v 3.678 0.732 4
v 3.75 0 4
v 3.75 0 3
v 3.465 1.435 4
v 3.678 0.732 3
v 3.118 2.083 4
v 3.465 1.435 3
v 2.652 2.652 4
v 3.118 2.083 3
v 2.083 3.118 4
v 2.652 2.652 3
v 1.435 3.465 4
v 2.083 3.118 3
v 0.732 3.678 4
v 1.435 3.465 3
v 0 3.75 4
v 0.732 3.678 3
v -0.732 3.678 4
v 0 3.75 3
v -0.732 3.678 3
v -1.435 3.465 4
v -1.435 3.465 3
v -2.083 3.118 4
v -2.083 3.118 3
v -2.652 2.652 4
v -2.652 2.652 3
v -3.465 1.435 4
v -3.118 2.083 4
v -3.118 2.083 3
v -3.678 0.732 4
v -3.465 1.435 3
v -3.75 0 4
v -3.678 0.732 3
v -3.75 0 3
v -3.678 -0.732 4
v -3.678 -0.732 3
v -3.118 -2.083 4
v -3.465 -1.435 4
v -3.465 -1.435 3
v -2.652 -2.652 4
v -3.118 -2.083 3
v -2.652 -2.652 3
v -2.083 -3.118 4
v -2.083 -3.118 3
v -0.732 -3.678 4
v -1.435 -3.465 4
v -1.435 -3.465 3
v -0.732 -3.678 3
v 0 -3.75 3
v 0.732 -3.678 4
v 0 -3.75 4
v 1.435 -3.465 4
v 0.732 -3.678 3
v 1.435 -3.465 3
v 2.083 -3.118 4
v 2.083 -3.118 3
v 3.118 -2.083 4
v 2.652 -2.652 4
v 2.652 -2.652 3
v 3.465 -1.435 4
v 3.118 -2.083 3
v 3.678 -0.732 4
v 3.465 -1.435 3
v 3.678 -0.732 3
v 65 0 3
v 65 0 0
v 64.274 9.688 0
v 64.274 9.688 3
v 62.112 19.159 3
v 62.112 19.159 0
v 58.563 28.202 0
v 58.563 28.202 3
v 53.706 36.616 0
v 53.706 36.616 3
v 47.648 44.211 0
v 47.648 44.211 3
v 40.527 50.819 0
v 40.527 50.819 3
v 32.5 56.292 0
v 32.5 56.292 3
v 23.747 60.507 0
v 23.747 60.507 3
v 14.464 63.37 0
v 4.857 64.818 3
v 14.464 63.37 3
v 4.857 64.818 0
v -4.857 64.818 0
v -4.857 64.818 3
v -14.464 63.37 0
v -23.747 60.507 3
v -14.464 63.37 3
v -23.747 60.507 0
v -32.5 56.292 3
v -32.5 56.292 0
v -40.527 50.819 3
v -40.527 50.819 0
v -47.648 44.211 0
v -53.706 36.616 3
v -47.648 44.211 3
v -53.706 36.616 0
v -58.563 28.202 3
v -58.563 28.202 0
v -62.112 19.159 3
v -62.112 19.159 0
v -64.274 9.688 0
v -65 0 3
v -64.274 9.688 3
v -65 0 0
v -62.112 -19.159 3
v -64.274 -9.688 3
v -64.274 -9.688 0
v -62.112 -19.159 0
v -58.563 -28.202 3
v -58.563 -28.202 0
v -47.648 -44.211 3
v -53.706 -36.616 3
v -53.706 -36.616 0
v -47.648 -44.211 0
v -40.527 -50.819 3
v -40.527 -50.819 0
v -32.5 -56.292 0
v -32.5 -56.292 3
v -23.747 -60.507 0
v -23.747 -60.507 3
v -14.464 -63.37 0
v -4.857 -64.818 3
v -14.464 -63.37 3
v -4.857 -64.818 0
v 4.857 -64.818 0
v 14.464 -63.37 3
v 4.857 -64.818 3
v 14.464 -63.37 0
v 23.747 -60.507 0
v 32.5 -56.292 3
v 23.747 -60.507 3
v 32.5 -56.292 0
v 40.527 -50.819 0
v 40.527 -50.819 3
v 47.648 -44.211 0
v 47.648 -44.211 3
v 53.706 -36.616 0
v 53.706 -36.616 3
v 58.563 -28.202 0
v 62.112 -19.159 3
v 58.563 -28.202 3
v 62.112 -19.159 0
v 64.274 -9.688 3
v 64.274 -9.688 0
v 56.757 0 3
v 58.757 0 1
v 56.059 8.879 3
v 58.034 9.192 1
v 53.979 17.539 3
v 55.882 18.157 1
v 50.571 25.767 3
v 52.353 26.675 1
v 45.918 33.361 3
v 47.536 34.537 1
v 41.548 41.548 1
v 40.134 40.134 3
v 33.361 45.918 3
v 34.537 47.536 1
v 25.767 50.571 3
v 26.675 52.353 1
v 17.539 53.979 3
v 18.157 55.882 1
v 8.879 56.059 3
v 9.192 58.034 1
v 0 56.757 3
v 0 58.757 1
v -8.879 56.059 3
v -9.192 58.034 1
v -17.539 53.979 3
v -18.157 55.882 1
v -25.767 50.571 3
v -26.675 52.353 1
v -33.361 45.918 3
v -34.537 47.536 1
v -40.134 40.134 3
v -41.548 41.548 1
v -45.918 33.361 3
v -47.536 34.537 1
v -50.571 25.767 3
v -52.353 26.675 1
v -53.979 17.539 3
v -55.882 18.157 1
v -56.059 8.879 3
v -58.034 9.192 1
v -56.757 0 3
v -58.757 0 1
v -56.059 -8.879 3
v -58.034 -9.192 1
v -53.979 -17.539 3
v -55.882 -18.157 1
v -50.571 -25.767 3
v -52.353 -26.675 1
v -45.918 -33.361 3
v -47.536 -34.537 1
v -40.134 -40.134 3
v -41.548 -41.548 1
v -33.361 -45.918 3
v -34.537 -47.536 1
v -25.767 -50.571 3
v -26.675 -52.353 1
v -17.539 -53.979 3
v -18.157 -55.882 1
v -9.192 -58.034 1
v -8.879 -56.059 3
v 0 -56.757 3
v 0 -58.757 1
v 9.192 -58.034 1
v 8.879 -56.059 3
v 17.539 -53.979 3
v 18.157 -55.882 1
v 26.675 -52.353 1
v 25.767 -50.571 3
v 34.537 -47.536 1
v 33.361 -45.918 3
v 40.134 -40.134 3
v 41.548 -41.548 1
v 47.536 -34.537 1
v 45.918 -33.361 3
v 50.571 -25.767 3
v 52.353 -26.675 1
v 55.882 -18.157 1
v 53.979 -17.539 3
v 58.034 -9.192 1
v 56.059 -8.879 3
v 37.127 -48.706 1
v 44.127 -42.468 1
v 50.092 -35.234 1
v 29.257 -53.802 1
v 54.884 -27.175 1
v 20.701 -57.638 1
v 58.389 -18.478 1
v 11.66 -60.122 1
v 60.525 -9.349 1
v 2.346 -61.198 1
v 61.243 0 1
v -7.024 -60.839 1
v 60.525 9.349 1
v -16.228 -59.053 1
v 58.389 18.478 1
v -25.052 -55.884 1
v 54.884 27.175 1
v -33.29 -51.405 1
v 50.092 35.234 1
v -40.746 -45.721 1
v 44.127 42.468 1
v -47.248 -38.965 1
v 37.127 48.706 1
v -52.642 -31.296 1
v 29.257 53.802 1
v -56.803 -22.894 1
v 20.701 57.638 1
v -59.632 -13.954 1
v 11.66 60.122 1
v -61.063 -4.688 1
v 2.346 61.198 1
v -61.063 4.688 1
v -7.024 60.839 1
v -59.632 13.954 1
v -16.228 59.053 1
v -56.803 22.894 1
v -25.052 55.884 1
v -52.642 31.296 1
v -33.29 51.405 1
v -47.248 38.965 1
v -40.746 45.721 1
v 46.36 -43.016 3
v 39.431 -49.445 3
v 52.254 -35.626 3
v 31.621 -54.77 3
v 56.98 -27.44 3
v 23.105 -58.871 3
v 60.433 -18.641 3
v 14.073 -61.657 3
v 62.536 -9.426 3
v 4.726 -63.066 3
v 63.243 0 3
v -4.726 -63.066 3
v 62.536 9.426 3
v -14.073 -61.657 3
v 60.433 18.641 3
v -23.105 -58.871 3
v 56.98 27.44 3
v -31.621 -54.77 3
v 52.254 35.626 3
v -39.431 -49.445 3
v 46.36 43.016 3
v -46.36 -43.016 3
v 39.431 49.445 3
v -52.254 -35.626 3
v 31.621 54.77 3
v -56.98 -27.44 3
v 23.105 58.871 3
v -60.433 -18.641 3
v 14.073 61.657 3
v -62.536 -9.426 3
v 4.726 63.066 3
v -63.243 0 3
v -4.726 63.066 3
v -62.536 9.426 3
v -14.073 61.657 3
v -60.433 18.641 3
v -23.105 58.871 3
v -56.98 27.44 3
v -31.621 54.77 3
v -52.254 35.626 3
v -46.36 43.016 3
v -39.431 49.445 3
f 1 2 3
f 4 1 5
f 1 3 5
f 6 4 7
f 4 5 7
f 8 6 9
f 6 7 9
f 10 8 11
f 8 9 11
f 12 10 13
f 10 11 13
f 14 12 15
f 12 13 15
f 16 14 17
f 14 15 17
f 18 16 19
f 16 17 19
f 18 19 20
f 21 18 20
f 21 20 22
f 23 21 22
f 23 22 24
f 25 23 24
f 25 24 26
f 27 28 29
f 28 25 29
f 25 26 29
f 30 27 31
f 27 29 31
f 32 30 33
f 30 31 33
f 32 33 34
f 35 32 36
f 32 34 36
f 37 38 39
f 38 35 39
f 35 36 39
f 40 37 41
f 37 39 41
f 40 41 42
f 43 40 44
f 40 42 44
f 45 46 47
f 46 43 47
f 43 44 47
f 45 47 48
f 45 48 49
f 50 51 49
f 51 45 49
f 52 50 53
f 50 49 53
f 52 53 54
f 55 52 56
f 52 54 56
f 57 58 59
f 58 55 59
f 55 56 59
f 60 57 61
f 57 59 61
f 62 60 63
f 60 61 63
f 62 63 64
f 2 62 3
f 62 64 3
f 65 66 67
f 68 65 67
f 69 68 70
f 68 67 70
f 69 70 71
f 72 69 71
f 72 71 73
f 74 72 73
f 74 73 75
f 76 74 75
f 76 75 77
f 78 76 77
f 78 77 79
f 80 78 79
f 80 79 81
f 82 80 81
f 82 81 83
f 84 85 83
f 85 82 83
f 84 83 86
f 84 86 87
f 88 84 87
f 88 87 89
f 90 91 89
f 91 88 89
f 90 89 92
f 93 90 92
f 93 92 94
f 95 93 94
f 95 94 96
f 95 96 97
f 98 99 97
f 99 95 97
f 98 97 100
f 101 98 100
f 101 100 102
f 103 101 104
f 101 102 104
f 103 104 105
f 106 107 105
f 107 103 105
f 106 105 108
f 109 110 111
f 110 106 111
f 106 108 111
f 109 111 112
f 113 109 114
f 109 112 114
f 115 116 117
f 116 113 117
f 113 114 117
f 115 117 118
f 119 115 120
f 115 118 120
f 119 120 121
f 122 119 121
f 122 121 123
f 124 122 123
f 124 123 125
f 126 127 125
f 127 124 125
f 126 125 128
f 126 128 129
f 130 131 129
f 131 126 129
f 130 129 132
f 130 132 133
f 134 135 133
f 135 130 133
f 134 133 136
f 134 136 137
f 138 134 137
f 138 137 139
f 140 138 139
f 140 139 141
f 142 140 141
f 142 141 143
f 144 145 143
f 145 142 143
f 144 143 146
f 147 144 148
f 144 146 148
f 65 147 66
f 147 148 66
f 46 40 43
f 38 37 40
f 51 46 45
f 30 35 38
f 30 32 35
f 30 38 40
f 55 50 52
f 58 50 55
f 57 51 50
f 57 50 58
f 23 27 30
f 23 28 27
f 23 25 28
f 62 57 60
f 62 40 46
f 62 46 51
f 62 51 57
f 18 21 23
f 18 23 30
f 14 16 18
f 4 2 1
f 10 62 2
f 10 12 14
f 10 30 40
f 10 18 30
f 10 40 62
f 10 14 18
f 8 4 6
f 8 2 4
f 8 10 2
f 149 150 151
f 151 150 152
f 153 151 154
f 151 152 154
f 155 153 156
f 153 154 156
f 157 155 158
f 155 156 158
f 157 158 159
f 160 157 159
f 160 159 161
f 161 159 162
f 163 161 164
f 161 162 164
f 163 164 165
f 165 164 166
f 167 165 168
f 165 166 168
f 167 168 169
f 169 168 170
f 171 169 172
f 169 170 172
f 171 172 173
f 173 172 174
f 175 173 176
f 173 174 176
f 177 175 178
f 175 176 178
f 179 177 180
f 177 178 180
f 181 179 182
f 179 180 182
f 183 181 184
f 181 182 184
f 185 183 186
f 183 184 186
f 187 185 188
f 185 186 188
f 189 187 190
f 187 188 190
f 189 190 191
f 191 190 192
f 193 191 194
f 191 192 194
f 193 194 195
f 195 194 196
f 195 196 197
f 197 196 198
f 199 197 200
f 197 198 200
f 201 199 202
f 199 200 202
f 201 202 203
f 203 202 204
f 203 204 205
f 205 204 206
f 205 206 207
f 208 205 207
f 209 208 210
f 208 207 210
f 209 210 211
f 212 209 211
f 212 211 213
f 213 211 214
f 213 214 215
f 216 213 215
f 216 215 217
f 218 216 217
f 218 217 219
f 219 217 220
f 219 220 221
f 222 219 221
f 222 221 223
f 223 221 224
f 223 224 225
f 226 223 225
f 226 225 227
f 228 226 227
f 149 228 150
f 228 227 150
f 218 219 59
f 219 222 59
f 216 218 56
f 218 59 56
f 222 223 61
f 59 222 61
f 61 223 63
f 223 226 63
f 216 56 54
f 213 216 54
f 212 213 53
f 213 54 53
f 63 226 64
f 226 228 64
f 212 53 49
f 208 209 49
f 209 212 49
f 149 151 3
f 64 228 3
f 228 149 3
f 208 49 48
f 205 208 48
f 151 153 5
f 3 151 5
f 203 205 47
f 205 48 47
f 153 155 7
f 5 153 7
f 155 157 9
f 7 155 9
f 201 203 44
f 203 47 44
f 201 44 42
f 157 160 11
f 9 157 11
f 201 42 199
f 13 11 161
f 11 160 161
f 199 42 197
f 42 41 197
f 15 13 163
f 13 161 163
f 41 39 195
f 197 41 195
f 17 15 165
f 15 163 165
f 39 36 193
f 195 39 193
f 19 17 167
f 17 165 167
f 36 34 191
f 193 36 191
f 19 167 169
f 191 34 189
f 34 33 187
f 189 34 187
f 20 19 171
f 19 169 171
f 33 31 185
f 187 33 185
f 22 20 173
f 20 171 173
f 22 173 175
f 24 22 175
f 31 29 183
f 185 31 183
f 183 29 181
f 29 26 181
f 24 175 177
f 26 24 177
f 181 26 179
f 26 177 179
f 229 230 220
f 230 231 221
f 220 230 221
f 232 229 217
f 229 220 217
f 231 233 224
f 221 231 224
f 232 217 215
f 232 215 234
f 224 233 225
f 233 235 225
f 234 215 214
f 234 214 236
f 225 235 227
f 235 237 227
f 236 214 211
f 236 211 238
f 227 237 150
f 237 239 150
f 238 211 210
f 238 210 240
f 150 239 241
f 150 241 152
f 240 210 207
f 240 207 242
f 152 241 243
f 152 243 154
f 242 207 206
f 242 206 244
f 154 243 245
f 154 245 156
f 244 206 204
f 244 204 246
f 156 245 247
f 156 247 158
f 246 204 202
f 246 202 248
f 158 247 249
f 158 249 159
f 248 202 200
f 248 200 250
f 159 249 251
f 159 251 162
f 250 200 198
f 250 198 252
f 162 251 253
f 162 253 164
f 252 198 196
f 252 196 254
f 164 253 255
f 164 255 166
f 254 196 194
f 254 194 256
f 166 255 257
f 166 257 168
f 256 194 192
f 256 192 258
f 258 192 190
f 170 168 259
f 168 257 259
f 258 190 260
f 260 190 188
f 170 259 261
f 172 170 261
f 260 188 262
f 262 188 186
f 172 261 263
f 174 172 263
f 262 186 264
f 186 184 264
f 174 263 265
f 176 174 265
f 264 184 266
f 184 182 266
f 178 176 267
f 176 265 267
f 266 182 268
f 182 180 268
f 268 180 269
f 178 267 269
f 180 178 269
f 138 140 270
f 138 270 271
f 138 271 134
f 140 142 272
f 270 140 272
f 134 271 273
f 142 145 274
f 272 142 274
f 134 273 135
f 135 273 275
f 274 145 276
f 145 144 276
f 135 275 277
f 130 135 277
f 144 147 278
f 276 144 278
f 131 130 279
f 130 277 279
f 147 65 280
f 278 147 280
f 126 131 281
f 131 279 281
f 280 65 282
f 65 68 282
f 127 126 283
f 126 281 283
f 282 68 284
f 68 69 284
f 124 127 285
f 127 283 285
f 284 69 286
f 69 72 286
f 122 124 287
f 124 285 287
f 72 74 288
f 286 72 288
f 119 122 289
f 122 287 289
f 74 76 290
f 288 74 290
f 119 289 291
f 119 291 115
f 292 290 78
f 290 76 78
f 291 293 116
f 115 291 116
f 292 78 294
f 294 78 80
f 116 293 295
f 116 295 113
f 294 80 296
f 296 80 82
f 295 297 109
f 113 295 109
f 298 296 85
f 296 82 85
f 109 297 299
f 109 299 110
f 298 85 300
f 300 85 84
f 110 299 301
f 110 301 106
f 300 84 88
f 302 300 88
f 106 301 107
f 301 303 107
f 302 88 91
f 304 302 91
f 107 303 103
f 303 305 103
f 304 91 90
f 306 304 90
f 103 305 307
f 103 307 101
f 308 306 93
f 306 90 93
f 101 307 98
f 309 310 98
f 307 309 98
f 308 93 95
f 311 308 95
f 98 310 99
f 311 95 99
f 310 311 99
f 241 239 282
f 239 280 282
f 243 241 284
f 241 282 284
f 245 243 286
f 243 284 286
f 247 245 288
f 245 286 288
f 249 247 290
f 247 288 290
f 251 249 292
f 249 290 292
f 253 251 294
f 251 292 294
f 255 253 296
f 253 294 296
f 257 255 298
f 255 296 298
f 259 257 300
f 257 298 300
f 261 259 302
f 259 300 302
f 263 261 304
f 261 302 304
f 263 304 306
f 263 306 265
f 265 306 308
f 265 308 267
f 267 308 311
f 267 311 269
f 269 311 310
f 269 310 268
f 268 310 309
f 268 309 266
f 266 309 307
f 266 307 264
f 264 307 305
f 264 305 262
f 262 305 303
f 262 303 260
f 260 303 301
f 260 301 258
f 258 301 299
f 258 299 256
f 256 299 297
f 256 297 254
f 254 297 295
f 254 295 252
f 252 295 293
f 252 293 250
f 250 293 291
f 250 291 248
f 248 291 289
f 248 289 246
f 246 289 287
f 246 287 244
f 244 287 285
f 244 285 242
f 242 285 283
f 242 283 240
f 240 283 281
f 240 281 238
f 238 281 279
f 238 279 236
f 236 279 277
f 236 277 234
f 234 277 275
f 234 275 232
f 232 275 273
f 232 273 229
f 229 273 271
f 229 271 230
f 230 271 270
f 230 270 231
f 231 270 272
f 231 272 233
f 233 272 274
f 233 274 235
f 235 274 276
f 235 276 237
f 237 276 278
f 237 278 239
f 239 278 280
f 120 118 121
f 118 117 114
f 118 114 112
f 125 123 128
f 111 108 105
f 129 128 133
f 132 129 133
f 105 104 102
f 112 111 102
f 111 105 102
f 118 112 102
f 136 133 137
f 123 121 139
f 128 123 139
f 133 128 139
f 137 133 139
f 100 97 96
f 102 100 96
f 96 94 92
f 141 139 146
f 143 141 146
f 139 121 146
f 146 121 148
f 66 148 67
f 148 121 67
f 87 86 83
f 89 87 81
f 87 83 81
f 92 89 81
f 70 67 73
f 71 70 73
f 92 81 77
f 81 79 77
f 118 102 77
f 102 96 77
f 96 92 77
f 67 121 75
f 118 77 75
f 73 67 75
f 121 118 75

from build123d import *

# Parameters (mm, degrees)
SKETCH002_R  = 65
PAD_DEPTH    = 4
POCKET_DEPTH = 20
CHAMFER_SIZE = 7


with BuildPart() as body001:
    # Sketch002 → Pad (new body)
    with BuildSketch(Plane.XY):
        Circle(SKETCH002_R)
    extrude(amount=PAD_DEPTH)


with BuildPart() as body:
    # Sketch → Revolution (revolve)
    with BuildSketch(Plane.XZ):
        Polygon((0, 0), (0, 15), (3.75, 15), (3.75, 3), (56.757359, 3), (58.757359, 1), (61.242641, 1), (63.242641, 3), (96.585786, 3), (98, 4.414214), (98, 20), (100, 20), (100, 0), align=None)
    revolve(axis=Axis((0, 0, 0), (0, 0, 1)))

    # Sketch001 (on DatumPlane) → Pocket (cut)
    with BuildSketch(Plane(origin=(0, 0, 4), x_dir=(-1, 0, 0), z_dir=(0, 0, 1))):
        with BuildLine():
            ThreePointArc((-60, -103.923048), (0, -120), (60, -103.923048))
            Line((32.5, -56.291651), (60, -103.923048))
            ThreePointArc((-32.5, -56.291651), (0, -65), (32.5, -56.291651))
            Line((-32.5, -56.291651), (-60, -103.923048))
        make_face()
    extrude(amount=POCKET_DEPTH, mode=Mode.SUBTRACT)

    # Chamfer
    chamfer_edges = [body.edges().sort_by_distance(p)[0] for p in [
        (-49.396447, 85.557155, 4),
        (49.396447, 85.557155, 4),
    ]]
    chamfer(chamfer_edges, length=CHAMFER_SIZE)

    # Boolean: intersect Body001
    add(body001.part, mode=Mode.INTERSECT)


solid = body.part
